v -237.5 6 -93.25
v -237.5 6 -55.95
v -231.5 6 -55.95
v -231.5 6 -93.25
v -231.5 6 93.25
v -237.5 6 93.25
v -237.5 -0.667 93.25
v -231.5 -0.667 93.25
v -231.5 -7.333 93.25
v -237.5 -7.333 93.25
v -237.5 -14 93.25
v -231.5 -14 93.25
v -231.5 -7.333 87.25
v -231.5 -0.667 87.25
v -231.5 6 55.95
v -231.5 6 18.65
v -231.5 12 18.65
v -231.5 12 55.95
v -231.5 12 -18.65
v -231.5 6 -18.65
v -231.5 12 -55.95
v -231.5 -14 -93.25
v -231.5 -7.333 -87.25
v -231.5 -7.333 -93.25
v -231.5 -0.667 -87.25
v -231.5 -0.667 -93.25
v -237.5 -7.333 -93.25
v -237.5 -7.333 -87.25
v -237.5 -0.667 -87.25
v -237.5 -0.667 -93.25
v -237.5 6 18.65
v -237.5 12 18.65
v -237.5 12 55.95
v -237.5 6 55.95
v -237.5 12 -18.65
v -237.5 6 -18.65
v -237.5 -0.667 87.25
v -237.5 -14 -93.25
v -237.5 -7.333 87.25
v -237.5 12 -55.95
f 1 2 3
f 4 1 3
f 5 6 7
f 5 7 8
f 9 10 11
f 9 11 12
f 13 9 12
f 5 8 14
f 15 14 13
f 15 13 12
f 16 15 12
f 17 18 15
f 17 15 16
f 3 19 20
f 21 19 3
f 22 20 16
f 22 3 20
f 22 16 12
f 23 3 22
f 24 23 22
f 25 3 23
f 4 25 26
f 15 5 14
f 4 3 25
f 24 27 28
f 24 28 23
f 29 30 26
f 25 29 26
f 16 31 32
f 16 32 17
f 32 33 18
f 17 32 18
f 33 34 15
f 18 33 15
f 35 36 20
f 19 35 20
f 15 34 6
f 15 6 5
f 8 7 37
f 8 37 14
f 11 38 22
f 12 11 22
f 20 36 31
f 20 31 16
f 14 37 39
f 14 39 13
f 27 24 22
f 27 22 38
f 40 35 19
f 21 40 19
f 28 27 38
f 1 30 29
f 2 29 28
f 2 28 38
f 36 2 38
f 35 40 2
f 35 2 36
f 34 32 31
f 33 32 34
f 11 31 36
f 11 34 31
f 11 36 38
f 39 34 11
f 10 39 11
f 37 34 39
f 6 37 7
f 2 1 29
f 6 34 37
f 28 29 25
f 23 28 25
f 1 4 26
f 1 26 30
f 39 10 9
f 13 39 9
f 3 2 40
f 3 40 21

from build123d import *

# Parameters (mm, degrees)
SKETCH1_W               = 415
SKETCH1_H               = 126.5
BOSS_EXTRUDE1_DEPTH     = 6
SKETCH2_W               = 6
SKETCH2_H               = 37.3
BOSS_EXTRUDE2_DEPTH     = 20
SKETCH1_2_W             = 415
SKETCH1_2_H             = 126.5
CUT_EXTRUDE1_DEPTH      = 7
CUT_EXTRUDE1_DEPTH_BACK = 15
SKETCH2_4_W             = 6
SKETCH2_4_H             = 37.3
BOSS_EXTRUDE3_DEPTH     = 6
SKETCH5_W               = 6
SKETCH5_H               = 6.666666666
CUT_EXTRUDE3_DEPTH      = 6


with BuildPart() as part:
    # Sketch1 → Boss-Extrude1 (new body)
    with BuildSketch(Plane(origin=(0, 0, 0), x_dir=(1, 0, 0), z_dir=(0, 1, 0))):
        Rectangle(SKETCH1_W, SKETCH1_H)
    extrude(amount=BOSS_EXTRUDE1_DEPTH)

    # Sketch1<2> → Cut-Extrude1 (cut, two sides)
    with BuildSketch(Plane(origin=(0, 0, 0), x_dir=(1, 0, 0), z_dir=(0, 1, 0))) as cut_extrude1_sk:
        Rectangle(SKETCH1_2_W, SKETCH1_2_H)
    extrude(amount=CUT_EXTRUDE1_DEPTH, mode=Mode.SUBTRACT)
    extrude(cut_extrude1_sk.sketch, amount=-CUT_EXTRUDE1_DEPTH_BACK, mode=Mode.SUBTRACT)


with BuildPart() as body_2:
    # Sketch2 → Boss-Extrude2 (new body)
    with BuildSketch(Plane(origin=(0, 6, 0), x_dir=(1, 0, 0), z_dir=(0, 1, 0))):
        Polygon((-237.5, 55.95), (-231.5, 55.95), (-231.5, 87.25), (-231.5, 93.25), (-237.5, 93.25), align=None)
        with Locations((-234.5, 37.3)):
            Rectangle(SKETCH2_W, SKETCH2_H)
        with Locations((-234.5, 0)):
            Rectangle(SKETCH2_W, SKETCH2_H)
        with Locations((-234.5, -37.3)):
            Rectangle(SKETCH2_W, SKETCH2_H)
        Polygon((-231.5, -93.25), (-231.5, -87.25), (-231.5, -55.95), (-237.5, -55.95), (-237.5, -93.25), align=None)
    extrude(amount=-BOSS_EXTRUDE2_DEPTH)

    # Sketch2<4> → Boss-Extrude3 (add)
    with BuildSketch(Plane(origin=(0, 6, 0), x_dir=(1, 0, 0), z_dir=(0, 1, 0))):
        with Locations((-234.5, -37.3)):
            Rectangle(SKETCH2_4_W, SKETCH2_4_H)
        with Locations((-234.5, 37.3)):
            Rectangle(SKETCH2_4_W, SKETCH2_4_H)
    extrude(amount=BOSS_EXTRUDE3_DEPTH)

    # Sketch5 → Cut-Extrude3 (cut)
    with BuildSketch(Plane.XY.offset(93.25)):
        with Locations((-234.5, -4)):
            Rectangle(SKETCH5_W, SKETCH5_H)
    cut_extrude3 = extrude(amount=-CUT_EXTRUDE3_DEPTH, mode=Mode.SUBTRACT)

    # Mirror3: Cut-Extrude3 across plane
    add(cut_extrude3.mirror(Plane.XY), mode=Mode.SUBTRACT)


solid = body_2.part
